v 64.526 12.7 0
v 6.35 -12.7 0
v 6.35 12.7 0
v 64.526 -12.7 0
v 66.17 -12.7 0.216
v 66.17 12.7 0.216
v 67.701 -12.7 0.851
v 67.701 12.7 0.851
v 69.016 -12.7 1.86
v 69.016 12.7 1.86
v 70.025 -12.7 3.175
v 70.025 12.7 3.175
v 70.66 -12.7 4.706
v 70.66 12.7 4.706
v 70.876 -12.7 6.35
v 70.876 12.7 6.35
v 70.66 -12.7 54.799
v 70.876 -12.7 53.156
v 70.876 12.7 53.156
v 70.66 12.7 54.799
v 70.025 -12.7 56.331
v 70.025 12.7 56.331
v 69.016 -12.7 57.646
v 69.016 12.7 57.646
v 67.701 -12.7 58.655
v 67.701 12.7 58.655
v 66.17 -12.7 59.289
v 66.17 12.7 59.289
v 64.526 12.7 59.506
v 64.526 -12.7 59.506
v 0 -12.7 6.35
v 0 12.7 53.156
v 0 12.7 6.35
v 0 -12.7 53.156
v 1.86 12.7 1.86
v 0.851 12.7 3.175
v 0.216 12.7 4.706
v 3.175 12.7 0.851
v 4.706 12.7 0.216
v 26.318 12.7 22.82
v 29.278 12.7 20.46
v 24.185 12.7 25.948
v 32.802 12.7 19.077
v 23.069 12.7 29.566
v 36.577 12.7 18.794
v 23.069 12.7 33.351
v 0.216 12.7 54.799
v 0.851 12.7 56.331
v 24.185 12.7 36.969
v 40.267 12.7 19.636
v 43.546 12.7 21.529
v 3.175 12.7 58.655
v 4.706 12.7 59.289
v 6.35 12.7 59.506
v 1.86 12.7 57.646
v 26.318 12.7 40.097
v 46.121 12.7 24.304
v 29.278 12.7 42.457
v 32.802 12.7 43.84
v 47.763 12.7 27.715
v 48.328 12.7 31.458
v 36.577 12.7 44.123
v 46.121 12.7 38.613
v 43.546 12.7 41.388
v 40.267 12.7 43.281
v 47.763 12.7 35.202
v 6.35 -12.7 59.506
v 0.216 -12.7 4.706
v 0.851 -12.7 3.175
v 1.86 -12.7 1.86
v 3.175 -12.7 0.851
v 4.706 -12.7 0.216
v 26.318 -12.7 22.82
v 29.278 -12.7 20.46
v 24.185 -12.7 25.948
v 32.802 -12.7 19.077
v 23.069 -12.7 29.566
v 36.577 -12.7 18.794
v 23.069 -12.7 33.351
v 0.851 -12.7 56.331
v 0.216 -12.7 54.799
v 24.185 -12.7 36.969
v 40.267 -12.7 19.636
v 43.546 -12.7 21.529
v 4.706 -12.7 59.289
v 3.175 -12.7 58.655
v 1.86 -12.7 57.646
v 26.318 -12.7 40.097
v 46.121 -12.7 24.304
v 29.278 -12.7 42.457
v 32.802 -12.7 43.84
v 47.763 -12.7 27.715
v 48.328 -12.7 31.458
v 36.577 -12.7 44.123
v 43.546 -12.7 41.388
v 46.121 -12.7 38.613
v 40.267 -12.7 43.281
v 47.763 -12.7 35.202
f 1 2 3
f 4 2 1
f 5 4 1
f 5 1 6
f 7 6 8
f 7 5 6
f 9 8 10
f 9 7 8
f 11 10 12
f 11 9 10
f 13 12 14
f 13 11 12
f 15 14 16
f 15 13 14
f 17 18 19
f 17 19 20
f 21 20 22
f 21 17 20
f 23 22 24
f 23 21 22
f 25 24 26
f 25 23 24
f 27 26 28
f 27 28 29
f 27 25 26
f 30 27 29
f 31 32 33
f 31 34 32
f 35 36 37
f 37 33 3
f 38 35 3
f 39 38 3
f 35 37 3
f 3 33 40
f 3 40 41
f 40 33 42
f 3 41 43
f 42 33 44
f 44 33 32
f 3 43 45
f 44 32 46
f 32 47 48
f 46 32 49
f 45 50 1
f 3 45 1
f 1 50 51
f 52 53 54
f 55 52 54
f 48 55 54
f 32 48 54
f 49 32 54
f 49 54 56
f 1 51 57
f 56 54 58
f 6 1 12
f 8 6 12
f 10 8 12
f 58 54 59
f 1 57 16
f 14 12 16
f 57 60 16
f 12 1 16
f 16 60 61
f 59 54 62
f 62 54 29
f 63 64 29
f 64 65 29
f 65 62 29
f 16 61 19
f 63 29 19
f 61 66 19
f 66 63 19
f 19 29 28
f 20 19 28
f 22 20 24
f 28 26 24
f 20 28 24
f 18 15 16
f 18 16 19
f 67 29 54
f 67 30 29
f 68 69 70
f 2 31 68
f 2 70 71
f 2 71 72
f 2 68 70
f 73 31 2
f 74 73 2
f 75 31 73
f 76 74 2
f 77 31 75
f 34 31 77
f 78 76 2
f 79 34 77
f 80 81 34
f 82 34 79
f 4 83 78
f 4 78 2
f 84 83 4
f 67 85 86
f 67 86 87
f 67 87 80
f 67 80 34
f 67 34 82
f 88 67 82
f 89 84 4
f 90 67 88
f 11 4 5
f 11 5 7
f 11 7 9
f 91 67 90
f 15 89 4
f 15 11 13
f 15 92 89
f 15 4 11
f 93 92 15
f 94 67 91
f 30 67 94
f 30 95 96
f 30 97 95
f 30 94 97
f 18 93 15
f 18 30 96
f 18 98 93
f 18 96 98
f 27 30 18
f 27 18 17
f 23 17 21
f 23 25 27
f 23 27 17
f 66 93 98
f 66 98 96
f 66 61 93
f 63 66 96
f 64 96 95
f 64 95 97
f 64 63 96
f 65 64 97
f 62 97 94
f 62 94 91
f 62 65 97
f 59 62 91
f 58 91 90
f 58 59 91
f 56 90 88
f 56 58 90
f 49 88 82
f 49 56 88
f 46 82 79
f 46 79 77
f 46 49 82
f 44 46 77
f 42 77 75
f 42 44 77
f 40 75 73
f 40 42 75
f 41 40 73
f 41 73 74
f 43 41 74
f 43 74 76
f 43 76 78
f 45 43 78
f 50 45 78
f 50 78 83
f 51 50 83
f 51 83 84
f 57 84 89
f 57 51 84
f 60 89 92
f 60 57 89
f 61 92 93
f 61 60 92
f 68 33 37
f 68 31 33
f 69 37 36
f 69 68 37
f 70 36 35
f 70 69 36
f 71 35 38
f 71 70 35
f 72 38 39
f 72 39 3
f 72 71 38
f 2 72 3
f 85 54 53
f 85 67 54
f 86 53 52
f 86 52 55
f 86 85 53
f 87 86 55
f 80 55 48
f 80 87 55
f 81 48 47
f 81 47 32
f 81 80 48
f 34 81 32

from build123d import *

# Parameters (mm, degrees)
F0_R     = 12.7
F1_DEPTH = 12.7


with BuildPart() as f1:
    # F0 (on Front) → F1 (new body, symmetric)
    with BuildSketch(Plane.XZ):
        with BuildLine():
            ThreePointArc((0, 6.35), (1.859872, 1.859872), (6.35, 0))
            Line((6.35, 0), (64.526166, 0))
            ThreePointArc((64.526166, 0), (69.016294, 1.859872), (70.876166, 6.35))
            Line((70.876166, 6.35), (70.876166, 53.155664))
            ThreePointArc((70.876166, 53.155664), (69.016294, 57.645792), (64.526166, 59.505664))
            Line((64.526166, 59.505664), (6.35, 59.505664))
            ThreePointArc((6.35, 59.505664), (1.859872, 57.645792), (0, 53.155664))
            Line((0, 53.155664), (0, 6.35))
        make_face()
        with Locations((35.627604, 31.458408)):
            Circle(F0_R, mode=Mode.SUBTRACT)
    extrude(amount=F1_DEPTH, both=True)


solid = f1.part
